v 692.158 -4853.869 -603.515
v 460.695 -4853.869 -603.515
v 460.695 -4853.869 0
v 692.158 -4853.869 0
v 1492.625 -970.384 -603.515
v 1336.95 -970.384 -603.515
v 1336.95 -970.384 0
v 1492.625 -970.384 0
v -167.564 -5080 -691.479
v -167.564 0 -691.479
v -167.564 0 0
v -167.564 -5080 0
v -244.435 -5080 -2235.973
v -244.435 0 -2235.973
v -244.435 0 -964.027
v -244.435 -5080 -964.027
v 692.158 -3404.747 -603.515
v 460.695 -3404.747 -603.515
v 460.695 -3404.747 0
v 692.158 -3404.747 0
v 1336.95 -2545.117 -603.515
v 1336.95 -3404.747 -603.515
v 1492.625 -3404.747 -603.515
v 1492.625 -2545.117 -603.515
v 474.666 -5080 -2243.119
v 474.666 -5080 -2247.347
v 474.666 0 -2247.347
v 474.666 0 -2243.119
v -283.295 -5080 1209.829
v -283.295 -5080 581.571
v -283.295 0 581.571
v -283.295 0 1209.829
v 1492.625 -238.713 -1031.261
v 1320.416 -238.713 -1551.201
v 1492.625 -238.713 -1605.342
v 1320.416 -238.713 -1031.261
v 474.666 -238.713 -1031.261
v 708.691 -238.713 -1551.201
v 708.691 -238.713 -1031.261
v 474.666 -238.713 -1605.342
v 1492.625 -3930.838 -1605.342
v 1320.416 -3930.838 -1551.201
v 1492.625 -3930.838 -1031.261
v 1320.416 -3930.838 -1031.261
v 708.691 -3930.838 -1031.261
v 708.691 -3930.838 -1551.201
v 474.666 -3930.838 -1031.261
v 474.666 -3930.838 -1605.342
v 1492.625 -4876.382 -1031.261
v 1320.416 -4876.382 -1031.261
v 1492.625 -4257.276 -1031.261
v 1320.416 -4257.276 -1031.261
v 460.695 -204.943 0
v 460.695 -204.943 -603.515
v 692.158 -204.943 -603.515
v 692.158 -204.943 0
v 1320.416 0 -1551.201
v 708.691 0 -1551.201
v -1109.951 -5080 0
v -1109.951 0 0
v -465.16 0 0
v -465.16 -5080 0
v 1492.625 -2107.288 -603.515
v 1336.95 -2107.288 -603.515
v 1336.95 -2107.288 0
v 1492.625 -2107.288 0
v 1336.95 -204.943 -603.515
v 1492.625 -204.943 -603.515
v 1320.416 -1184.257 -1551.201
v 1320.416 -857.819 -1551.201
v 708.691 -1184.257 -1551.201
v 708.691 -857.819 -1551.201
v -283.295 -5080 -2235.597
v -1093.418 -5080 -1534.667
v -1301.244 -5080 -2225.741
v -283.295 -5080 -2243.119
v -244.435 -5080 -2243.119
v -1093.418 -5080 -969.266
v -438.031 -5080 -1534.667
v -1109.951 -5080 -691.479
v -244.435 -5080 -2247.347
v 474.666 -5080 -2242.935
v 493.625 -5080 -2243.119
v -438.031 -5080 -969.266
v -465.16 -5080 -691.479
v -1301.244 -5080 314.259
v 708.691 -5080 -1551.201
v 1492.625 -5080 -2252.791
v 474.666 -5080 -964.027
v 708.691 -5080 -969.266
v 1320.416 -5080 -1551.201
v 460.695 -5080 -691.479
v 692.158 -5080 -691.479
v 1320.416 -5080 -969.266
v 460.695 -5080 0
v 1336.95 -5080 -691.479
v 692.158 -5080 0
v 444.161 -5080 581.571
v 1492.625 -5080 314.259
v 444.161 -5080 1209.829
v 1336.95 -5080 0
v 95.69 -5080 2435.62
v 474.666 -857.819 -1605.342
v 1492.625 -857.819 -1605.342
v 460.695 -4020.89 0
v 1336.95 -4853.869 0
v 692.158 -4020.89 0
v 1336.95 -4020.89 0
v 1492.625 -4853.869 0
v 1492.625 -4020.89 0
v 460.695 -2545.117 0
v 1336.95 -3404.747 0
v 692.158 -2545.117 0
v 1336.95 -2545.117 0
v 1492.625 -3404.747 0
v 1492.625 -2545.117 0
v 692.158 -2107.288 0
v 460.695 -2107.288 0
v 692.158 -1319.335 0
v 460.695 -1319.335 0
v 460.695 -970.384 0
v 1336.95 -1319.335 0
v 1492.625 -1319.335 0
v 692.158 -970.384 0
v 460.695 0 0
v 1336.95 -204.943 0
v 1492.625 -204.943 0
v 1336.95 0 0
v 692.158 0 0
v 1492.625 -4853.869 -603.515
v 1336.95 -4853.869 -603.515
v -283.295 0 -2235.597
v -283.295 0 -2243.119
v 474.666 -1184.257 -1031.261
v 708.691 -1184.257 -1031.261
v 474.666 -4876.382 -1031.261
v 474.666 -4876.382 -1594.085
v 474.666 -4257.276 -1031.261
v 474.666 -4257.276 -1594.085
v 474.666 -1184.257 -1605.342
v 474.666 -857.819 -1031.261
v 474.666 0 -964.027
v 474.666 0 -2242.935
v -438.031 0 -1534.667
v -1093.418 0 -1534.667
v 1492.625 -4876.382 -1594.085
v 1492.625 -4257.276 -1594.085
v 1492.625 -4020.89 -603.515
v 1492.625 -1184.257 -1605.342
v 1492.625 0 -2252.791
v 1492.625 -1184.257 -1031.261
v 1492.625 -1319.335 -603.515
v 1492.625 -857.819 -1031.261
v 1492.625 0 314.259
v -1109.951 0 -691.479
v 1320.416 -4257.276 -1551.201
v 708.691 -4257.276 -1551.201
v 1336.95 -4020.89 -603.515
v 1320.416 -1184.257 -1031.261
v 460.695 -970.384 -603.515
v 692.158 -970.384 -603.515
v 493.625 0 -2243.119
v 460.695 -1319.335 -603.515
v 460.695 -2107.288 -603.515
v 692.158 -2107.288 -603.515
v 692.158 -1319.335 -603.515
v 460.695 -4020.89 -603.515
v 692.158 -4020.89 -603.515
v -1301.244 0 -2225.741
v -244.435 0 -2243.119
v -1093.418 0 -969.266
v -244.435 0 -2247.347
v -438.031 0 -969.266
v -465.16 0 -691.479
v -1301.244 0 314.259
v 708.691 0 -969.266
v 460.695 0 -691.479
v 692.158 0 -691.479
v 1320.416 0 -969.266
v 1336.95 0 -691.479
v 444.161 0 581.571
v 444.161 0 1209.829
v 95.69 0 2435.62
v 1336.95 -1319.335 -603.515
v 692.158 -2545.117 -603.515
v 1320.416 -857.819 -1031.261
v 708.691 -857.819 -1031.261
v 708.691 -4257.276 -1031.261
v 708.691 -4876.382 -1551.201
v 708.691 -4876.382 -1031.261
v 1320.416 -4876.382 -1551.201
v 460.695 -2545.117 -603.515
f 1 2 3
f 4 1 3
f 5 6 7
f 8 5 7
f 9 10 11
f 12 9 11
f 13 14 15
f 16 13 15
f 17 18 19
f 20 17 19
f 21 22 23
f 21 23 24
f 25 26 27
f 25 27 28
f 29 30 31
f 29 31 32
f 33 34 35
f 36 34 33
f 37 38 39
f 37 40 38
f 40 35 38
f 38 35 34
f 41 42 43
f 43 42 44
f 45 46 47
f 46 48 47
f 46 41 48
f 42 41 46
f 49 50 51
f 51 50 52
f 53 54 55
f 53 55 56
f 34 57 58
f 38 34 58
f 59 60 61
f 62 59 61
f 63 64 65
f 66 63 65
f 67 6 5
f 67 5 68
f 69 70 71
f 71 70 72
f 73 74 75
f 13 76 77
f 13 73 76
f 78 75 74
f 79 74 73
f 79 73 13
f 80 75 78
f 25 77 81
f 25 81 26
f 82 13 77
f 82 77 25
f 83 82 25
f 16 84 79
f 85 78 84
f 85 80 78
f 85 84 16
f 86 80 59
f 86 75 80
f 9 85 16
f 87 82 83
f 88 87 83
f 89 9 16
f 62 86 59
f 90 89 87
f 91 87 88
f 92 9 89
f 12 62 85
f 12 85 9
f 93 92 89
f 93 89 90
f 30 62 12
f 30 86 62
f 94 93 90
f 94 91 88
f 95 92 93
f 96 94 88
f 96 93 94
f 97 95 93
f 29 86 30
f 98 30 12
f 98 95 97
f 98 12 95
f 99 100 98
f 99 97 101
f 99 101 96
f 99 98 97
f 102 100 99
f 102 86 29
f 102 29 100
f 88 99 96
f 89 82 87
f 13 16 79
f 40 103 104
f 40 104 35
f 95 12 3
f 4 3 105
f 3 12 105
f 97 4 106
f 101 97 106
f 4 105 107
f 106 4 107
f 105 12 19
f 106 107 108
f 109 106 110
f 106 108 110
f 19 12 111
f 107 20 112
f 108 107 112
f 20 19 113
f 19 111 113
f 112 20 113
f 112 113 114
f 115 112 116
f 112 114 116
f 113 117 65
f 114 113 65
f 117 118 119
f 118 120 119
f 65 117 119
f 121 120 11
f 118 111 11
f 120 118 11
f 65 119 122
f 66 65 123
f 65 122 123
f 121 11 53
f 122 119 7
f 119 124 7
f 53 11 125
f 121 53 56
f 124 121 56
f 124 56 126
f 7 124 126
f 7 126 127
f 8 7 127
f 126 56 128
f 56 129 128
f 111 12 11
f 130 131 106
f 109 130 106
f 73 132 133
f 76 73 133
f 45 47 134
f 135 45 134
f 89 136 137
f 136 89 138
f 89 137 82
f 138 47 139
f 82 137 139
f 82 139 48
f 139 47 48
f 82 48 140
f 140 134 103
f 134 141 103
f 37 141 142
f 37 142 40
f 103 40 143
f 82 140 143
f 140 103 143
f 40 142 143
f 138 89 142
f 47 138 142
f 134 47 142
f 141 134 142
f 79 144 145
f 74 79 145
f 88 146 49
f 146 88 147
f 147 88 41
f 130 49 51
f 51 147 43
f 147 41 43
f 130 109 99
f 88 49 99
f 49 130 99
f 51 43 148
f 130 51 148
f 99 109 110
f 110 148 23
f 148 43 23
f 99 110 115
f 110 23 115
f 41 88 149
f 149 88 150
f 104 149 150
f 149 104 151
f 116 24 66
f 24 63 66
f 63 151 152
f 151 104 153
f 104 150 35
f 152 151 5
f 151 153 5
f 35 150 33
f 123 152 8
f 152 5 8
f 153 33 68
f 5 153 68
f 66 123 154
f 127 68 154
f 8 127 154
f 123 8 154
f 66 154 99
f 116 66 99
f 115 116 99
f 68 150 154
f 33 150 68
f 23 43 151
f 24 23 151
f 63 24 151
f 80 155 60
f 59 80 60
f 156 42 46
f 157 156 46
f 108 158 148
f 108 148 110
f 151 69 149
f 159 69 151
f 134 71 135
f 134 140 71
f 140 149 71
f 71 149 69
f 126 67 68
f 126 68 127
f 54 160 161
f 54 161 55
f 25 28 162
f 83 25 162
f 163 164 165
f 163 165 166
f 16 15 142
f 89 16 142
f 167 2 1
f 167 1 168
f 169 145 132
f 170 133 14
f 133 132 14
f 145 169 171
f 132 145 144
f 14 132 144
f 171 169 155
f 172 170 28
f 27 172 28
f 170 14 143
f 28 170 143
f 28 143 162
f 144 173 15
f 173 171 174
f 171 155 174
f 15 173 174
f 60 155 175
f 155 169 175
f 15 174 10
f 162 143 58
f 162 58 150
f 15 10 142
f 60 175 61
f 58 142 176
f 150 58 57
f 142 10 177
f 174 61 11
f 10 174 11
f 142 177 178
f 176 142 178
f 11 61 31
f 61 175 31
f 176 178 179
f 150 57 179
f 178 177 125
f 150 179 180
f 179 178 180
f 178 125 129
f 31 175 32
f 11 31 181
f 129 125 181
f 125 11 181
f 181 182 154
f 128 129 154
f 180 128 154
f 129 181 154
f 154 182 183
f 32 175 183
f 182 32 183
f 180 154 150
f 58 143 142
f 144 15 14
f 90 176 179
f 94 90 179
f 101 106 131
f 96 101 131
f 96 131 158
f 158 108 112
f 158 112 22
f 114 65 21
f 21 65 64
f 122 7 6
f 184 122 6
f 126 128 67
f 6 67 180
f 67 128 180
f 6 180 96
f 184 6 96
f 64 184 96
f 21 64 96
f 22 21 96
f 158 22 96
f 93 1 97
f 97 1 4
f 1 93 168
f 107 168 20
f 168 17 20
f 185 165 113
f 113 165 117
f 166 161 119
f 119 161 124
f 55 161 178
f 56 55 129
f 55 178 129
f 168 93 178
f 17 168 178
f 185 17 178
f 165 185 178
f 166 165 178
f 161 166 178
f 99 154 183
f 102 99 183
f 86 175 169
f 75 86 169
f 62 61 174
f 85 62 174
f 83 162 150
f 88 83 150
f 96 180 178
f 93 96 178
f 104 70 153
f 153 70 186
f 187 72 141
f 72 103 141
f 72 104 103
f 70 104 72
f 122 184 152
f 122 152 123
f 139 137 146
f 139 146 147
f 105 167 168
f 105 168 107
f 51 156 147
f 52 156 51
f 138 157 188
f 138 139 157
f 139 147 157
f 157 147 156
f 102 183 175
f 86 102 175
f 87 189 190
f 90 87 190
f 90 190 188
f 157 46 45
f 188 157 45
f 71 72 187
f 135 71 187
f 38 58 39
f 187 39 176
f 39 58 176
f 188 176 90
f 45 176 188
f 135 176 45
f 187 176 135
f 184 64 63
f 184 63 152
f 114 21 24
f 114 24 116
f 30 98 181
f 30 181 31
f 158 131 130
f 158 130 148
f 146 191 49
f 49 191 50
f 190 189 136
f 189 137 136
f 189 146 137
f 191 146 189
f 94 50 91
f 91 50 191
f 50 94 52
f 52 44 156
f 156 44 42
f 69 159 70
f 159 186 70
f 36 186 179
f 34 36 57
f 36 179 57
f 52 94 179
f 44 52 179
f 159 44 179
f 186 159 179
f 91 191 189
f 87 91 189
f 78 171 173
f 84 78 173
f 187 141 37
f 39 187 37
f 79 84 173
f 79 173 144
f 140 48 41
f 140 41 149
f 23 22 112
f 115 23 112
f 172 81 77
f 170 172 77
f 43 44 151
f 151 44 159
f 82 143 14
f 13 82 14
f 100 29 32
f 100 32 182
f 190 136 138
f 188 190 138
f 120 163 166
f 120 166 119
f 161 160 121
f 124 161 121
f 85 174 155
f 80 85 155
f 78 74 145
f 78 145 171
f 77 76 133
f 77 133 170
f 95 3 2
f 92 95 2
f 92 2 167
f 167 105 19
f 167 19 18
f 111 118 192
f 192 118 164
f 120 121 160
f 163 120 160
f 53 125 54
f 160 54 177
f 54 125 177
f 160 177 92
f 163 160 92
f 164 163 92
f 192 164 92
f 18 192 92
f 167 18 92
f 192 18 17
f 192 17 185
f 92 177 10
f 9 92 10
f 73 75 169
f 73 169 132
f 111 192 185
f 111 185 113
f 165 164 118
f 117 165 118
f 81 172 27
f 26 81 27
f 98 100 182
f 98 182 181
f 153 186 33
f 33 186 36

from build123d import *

# Parameters (mm, degrees)
F0_W     = 719.1014140844
F0_H     = 4.2285388547
F1_DEPTH = 5080
F2_W     = 619.1064715385
F2_H     = 574.0804672241
F2_W_2   = 2746.581196785
F2_W_3   = 619.1062927246
F2_H_2   = 562.824010849
F2_W_4   = 859.6296310425
F2_H_3   = 603.514790535
F2_W_5   = 832.9792022705
F2_W_6   = 787.9537343979
F2_W_7   = 765.4407322407
F3_DEPTH = 22860


with BuildPart() as f1:
    # F0 (on Front) → F1 (new body)
    with BuildSketch(Plane.XZ):
        Polygon((1492.6249932137, 314.2587009146), (-1301.2440692736, 314.2587009146), (-1301.2440692736, -2225.7412990854), (-283.2953631878, -2235.5967159756), (-283.2953631878, -873.3429312706), (493.6245184562, -873.3429312706), (493.6245184562, -2243.1185776156), (1492.6249932137, -2252.7905444773), align=None)
        Polygon((-1093.4180021286, -1251.9666472425), (-1093.4180021286, -969.2659217814), (-765.7246668978, -969.2659217814), (-438.031331667, -969.2659217814), (-438.031331667, -1251.9666472425), (-438.031331667, -1534.6673727036), (-765.7246668978, -1534.6673727036), (-1093.4180021286, -1534.6673727036), align=None, mode=Mode.SUBTRACT)
        Polygon((-1109.9511384964, -345.739364624), (-1109.9511384964, 0), (-787.5555157661, 0), (-465.1598930359, 0), (-465.1598930359, -345.739364624), (-465.1598930359, -691.478729248), (-787.5555157661, -691.478729248), (-1109.9511384964, -691.478729248), align=None, mode=Mode.SUBTRACT)
        Polygon((708.6911201477, -1260.2333346357), (708.6911201477, -969.2659217814), (1014.5537257195, -969.2659217814), (1320.4163312912, -969.2659217814), (1320.4163312912, -1260.2333346357), (1320.4163312912, -1551.2007474899), (1014.5537257195, -1551.2007474899), (708.6911201477, -1551.2007474899), align=None, mode=Mode.SUBTRACT)
        Polygon((-167.5638109446, -345.739364624), (-167.5638109446, 0), (146.5654447675, 0), (460.6947004795, 0), (460.6947004795, -345.739364624), (460.6947004795, -691.478729248), (146.5654447675, -691.478729248), (-167.5638109446, -691.478729248), align=None, mode=Mode.SUBTRACT)
        Polygon((692.1581625938, -345.739364624), (692.1581625938, 0), (1014.5538747311, 0), (1336.9495868683, 0), (1336.9495868683, -345.739364624), (1336.9495868683, -691.478729248), (1014.5538747311, -691.478729248), (692.1581625938, -691.478729248), align=None, mode=Mode.SUBTRACT)
        Polygon((95.69046197, 2435.6200363355), (-1301.2440692736, 314.2587009146), (1492.6249932137, 314.2587009146), align=None)
        Polygon((-283.2953631878, 895.6999182701), (-283.2953631878, 1209.8290920258), (80.4329961538, 1209.8290920258), (444.1613554955, 1209.8290920258), (444.1613554955, 895.6999182701), (444.1613554955, 581.5707445145), (80.4329961538, 581.5707445145), (-283.2953631878, 581.5707445145), align=None, mode=Mode.SUBTRACT)
        Polygon((-283.2953631878, -873.3429312706), (-283.2953631878, -2235.5967159756), (-244.4353848696, -2235.972944448), (-244.4353848696, -964.0274047852), (474.6660292149, -964.0274047852), (474.6660292149, -2242.9350282737), (493.6245184562, -2243.1185776156), (493.6245184562, -873.3429312706), align=None)
        Polygon((-244.4353848696, -2235.972944448), (-283.2953631878, -2235.5967159756), (-283.2953631878, -2243.1185776156), (-244.4353848696, -2243.1185776156), align=None)
        Polygon((474.6660292149, -2242.9350282737), (-244.4353848696, -2235.972944448), (-244.4353848696, -2243.1185776156), (474.6660292149, -2243.1185776156), align=None)
        Polygon((474.6660292149, -2243.1185776156), (493.6245184562, -2243.1185776156), (474.6660292149, -2242.9350282737), align=None)
        with Locations((115.1153221726, -2245.232847043)):
            Rectangle(F0_W, F0_H)
    extrude(amount=F1_DEPTH)

    # F2 (on Right) → F3 (cut)
    with BuildSketch(Plane.YZ):
        with Locations((-548.2657849789, -1318.301320076)):
            Rectangle(F2_W, F2_H)
        with Locations((-2557.5475096703, -1318.301320076)):
            Rectangle(F2_W_2, F2_H)
        with Locations((-4566.8292045593, -1312.6730918884)):
            Rectangle(F2_W_3, F2_H_2)
        with Locations((-2974.9321937561, -301.7573952675)):
            Rectangle(F2_W_4, F2_H_3)
        with Locations((-4437.3798370361, -301.7573952675)):
            Rectangle(F2_W_5, F2_H_3)
        with Locations((-1713.3114933968, -301.7573952675)):
            Rectangle(F2_W_6, F2_H_3)
        with Locations((-587.6635164022, -301.7573952675)):
            Rectangle(F2_W_7, F2_H_3)
    extrude(amount=F3_DEPTH, mode=Mode.SUBTRACT)


solid = f1.part
